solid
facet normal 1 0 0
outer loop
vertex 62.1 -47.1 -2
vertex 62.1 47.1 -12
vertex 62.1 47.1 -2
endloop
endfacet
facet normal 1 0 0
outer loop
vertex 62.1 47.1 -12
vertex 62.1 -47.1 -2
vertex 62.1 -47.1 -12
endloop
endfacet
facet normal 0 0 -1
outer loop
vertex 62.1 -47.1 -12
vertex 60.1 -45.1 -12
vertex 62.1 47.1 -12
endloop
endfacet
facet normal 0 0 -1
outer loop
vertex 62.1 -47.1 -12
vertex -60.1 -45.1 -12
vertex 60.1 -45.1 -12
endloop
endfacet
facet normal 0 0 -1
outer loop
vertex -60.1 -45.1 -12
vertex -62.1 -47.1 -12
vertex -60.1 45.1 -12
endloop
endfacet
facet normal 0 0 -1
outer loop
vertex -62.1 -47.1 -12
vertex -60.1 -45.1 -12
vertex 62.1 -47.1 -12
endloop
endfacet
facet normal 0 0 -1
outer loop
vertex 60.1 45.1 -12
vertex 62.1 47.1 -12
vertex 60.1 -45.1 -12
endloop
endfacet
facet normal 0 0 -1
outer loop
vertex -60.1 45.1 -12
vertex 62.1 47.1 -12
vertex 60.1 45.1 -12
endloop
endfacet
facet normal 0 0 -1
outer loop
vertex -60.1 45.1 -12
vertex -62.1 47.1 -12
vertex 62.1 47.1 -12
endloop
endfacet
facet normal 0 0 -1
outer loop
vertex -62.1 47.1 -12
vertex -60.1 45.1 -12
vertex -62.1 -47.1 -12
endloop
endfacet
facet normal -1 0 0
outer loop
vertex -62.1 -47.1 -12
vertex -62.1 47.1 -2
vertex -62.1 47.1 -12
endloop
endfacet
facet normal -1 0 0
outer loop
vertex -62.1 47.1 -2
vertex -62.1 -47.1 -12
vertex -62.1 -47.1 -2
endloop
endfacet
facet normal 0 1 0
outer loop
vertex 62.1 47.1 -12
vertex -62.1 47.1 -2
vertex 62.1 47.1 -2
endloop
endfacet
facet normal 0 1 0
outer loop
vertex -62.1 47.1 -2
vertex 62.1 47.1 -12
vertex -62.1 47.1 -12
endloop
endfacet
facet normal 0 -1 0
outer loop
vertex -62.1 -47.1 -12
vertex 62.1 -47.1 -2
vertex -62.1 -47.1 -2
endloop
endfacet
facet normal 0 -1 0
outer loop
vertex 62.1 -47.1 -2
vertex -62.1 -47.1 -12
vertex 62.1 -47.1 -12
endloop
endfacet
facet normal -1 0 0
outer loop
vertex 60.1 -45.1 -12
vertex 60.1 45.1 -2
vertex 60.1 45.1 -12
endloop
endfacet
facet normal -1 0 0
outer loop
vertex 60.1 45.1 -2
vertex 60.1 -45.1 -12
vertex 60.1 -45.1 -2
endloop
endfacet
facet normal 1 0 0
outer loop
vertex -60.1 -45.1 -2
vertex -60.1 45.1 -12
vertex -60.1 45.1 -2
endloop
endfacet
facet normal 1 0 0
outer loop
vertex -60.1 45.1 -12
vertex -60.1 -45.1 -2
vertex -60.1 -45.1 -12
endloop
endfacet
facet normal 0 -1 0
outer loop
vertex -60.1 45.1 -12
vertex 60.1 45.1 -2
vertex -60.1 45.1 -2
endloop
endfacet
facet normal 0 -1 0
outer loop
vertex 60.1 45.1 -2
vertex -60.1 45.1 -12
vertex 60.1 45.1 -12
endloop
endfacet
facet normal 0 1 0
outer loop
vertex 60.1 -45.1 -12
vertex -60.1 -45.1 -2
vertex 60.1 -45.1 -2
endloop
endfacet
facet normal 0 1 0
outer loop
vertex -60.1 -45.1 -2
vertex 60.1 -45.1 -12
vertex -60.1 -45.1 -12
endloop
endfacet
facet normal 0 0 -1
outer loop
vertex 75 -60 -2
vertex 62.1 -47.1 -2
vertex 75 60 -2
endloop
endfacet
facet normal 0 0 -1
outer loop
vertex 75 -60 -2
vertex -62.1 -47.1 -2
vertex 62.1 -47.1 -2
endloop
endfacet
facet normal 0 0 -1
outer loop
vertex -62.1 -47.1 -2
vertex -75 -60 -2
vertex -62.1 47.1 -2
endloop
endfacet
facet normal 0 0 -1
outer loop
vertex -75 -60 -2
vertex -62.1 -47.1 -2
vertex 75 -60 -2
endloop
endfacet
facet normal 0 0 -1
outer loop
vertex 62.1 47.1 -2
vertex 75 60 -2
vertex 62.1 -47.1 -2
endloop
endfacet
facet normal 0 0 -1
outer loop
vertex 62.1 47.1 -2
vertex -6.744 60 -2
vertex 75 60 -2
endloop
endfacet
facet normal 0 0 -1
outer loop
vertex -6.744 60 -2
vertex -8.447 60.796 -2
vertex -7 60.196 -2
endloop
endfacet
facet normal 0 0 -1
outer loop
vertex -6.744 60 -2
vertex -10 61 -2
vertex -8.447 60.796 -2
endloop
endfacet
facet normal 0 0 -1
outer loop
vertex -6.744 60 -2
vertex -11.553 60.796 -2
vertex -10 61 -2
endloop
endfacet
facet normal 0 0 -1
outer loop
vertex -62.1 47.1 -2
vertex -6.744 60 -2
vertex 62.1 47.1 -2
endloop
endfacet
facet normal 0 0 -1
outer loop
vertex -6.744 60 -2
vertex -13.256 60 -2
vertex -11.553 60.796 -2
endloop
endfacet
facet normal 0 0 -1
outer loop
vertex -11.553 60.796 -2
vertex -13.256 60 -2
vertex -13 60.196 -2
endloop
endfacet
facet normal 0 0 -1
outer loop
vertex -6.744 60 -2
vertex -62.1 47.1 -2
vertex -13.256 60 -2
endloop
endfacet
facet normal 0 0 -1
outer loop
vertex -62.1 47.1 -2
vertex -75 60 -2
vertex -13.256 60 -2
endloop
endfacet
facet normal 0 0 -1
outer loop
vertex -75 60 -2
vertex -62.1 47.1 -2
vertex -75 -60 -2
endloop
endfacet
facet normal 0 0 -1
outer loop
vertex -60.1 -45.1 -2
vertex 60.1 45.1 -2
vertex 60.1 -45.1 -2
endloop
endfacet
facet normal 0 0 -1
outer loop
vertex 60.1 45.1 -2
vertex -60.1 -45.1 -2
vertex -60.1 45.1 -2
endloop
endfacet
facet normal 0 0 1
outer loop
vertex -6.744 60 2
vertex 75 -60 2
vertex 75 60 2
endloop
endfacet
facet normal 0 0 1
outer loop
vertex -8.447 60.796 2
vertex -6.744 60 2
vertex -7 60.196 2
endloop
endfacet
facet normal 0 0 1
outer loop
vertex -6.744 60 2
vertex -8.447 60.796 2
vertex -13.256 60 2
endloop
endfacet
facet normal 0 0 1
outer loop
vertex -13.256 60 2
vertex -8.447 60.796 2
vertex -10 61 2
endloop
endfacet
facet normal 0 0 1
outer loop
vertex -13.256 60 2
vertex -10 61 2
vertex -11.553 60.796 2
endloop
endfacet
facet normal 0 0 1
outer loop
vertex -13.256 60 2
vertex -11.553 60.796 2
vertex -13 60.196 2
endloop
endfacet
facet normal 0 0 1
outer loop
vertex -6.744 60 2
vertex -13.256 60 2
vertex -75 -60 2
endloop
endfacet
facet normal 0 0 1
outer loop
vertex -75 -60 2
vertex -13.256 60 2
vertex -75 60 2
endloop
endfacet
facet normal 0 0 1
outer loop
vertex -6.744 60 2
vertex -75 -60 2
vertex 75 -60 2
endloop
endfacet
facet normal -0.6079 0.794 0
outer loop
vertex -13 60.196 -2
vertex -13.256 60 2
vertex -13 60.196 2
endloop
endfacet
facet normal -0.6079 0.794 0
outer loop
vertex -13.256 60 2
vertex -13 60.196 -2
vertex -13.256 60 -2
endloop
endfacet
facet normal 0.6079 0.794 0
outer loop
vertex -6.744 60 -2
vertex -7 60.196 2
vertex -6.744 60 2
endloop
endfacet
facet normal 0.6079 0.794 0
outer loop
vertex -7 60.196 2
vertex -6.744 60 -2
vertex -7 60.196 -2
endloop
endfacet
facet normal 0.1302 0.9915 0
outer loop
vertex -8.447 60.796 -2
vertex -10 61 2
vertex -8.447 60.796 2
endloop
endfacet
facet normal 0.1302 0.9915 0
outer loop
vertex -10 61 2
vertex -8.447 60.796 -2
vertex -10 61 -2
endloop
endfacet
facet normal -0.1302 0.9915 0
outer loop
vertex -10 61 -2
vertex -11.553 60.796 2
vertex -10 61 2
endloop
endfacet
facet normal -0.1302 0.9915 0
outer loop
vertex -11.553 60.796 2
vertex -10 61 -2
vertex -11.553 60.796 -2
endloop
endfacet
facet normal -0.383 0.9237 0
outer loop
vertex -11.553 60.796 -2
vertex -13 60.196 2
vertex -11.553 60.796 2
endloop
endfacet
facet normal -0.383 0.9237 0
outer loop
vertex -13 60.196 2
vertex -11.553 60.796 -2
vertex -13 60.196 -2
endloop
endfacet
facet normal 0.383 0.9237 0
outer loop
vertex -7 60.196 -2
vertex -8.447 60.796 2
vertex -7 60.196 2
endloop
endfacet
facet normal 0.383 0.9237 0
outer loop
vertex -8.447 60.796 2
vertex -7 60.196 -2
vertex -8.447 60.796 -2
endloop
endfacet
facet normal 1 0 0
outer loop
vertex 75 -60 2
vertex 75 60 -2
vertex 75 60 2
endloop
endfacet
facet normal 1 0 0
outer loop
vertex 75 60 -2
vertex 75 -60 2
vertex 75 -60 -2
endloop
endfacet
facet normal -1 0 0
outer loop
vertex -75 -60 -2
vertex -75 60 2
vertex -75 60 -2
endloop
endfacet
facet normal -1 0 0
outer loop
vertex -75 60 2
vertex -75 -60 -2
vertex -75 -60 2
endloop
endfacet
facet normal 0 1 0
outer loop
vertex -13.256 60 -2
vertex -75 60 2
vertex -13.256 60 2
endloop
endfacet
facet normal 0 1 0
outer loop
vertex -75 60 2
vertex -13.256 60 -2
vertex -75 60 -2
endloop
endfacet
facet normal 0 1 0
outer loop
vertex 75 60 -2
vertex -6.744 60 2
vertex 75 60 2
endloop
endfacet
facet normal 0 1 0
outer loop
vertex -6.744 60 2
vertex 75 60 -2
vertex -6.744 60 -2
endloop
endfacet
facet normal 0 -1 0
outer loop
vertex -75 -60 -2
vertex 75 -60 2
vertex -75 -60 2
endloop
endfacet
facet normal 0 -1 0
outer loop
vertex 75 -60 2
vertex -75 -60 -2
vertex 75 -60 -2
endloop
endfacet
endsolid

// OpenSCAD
// file: params.scad
// Shared parameters — edit this file only, every part picks these up via
// `include`. Meccanismo: tramoggia (bulk, >=100 sigarette sfuse) -> rullo
// scanalato (singolarizzatore) -> scivolo -> pulsante frontale.
//
// MISURA LE TUE SIGARETTE PRIMA DI STAMPARE. Questi sono valori tipici per
// un formato king-size con filtro (~84mm x ~7.9mm) — verificalo con un
// calibro sulle sigarette che userai davvero (JPS o altro) e correggi.

cig_l      = 84;    // lunghezza sigaretta (mm)
cig_d      = 7.9;   // diametro sigaretta (mm)
clear_ax   = 2;      // gioco assiale (lungo il rullo) per lato
clear_rad  = 1.5;    // gioco radiale nella scanalatura

// --- Rullo scanalato ---------------------------------------------------
flutes       = 8;    // numero di scanalature attorno al rullo
wall         = 3.5;  // parete minima tra due scanalature (robustezza stampa)
shaft_d      = 6;    // foro per accoppiatore albero motore

groove_d   = cig_d + 2*clear_rad;                 // diametro scanalatura
flute_pitch_arc = groove_d + wall;                // passo tra scanalature (arco)
r_pitch    = flute_pitch_arc * flutes / (2*PI);   // raggio al centro delle scanalature
// Il grezzo del rullo si ferma esattamente al raggio r_pitch: ogni
// scanalatura è un foro cilindrico centrato SU quel raggio, quindi viene
// tagliata a metà dalla superficie del grezzo, lasciando un canale a "U"
// aperto verso l'esterno (non un foro cieco tangente alla superficie —
// un tentativo precedente con roller_r = r_pitch + groove_d/2 produceva
// una mesh non manifold, tangente in un solo punto).
roller_r   = r_pitch;                             // raggio esterno rullo (creste)
core_r     = r_pitch - groove_d/2;                // raggio al fondo scanalatura
roller_len = cig_l + 2*clear_ax;

// --- Alloggiamento (housing a "C") --------------------------------------
// Deve coprire anche la sporgenza della sigaretta oltre le creste (la
// scanalatura è più larga della sigaretta per il gioco, quindi la
// sigaretta non sta a filo — protrude di circa clear_rad..2*clear_rad).
housing_clear   = 4;                   // gioco radiale rullo/alloggiamento
housing_ir      = roller_r + housing_clear; // raggio interno alloggiamento
housing_wall    = 3;
housing_or      = housing_ir + housing_wall;
end_plate_t     = 4;

// apertura di carico (sopra, sotto la tramoggia) e di scarico (sotto)
load_gap_deg    = 55;   // ampiezza apertura di carico
discharge_gap_deg = 40; // ampiezza apertura di scarico
// l'apertura di carico è centrata in alto (90°), quella di scarico in
// basso (270°) nel piano di rotazione del rullo (asse orizzontale, vista
// dal fronte lungo l'asse Y)

// --- Tramoggia (hopper) --------------------------------------------------
// Capienza richiesta: >=100 sigarette sfuse. Volume solido di 100 sigarette
// =~ 411 cm3; per cilindretti alla rinfusa il fattore di impaccamento reale
// è basso e variabile (si intasano/incrociano) — 35-50% è una stima
// prudente. Le dimensioni sotto danno un volume utile di ~1.3 L, che
// garantisce >=100 pezzi anche nello scenario pessimistico (35%): vedi il
// conto fatto per questo file (~111 sigarette al 35%, fino a ~158 al 50%).
hopper_top_w   = 130;
hopper_top_d   = 100;
hopper_bot_w   = roller_len + 6;   // combacia con la larghezza del rullo
hopper_bot_d   = 34;
hopper_h       = 190;
hopper_wall    = 2.4;

// --- Bordo/coperchio/serratura tramoggia (hopper.scad + hopper_lid.scad) -
rim_w        = 10;   // sporgenza del bordo oltre l'apertura
rim_t        = 4;
hinge_hole_d = 3.2;
hinge_x      = [-30, 30];  // posizione viti cerniera, lato -Y (fronte)
latch_hole_d = 4;          // foro per il gancio della serratura, lato +Y (retro)
reed_hole_d  = 6;          // foro per il sensore magnetico di sportello chiuso

// --- Mobile esterno (cabinet.scad) — pannelli piatti, non stampati -------
// Un guscio 3D pieno di queste dimensioni non è stampabile in un pezzo
// solo: qui si generano pannelli piatti (taglio laser/CNC/sega) che
// racchiudono il meccanismo, lasciando accessibili solo pulsante,
// feritoia e sportello tramoggia con serratura.
cab_w        = 180;   // larghezza (sx-dx)
cab_d        = 240;   // profondità (fronte-retro)
cab_h        = 420;   // altezza
panel_mat_t  = 9;     // spessore materiale pannelli (legno 9mm o simile — adatta)
cab_back_margin = 15; // margine tra il bordo posteriore e il ritaglio tramoggia
// main file
// Coperchio della tramoggia — stampa 1x. Si appoggia sul bordo aggiunto in
// hopper.scad (hopper_rim), con un labbro che scende dentro l'apertura
// per allinearsi e non lasciare fessure per le dita. Si apre con una
// cerniera comune (non stampata: vedi bom.md) fissata sul lato fronte, e
// si blocca con la serratura elettrica sul lato retro — vedi
// software/esphome (switch "Serratura tramoggia") e hardware/wiring.md
// per il sensore magnetico che conferma allo sportello di essere chiuso
// prima che il firmware autorizzi un'erogazione.
include <params.scad>

lid_w = hopper_top_w + 2*rim_w;
lid_d = hopper_top_d + 2*rim_w;
lid_t = 4;
skirt_h = 12;
skirt_wall = 2;

module lid_plate() {
    cube([lid_w, lid_d, lid_t], center = true);
}

module skirt() {
    // scende dentro l'apertura interna della tramoggia (dentro le pareti,
    // non dentro il bordo) per centrare il coperchio e chiudere la fessura
    inner_w = hopper_top_w - 2*hopper_wall - 1;
    inner_d = hopper_top_d - 2*hopper_wall - 1;
    translate([0, 0, -skirt_h/2])
        difference() {
            cube([inner_w, inner_d, skirt_h], center = true);
            cube([inner_w - 2*skirt_wall, inner_d - 2*skirt_wall, skirt_h + 2], center = true);
        }
}

module hinge_tab(x) {
    translate([x, -lid_d/2 + rim_w/2, 0])
        difference() {
            cylinder(d = 10, h = lid_t, center = true, $fn = 20);
            cylinder(d = hinge_hole_d, h = lid_t + 2, center = true, $fn = 16);
        }
}

module latch_catch() {
    // linguetta con foro per il gancio/perno della serratura elettrica
    translate([-10, lid_d/2 - rim_w/2, 0])
        difference() {
            cylinder(d = 12, h = lid_t, center = true, $fn = 24);
            cylinder(d = latch_hole_d + 1, h = lid_t + 2, center = true, $fn = 16);
        }
}

module hopper_lid() {
    union() {
        lid_plate();
        skirt();
        for (x = hinge_x) hinge_tab(x);
        latch_catch();
    }
}

hopper_lid();
